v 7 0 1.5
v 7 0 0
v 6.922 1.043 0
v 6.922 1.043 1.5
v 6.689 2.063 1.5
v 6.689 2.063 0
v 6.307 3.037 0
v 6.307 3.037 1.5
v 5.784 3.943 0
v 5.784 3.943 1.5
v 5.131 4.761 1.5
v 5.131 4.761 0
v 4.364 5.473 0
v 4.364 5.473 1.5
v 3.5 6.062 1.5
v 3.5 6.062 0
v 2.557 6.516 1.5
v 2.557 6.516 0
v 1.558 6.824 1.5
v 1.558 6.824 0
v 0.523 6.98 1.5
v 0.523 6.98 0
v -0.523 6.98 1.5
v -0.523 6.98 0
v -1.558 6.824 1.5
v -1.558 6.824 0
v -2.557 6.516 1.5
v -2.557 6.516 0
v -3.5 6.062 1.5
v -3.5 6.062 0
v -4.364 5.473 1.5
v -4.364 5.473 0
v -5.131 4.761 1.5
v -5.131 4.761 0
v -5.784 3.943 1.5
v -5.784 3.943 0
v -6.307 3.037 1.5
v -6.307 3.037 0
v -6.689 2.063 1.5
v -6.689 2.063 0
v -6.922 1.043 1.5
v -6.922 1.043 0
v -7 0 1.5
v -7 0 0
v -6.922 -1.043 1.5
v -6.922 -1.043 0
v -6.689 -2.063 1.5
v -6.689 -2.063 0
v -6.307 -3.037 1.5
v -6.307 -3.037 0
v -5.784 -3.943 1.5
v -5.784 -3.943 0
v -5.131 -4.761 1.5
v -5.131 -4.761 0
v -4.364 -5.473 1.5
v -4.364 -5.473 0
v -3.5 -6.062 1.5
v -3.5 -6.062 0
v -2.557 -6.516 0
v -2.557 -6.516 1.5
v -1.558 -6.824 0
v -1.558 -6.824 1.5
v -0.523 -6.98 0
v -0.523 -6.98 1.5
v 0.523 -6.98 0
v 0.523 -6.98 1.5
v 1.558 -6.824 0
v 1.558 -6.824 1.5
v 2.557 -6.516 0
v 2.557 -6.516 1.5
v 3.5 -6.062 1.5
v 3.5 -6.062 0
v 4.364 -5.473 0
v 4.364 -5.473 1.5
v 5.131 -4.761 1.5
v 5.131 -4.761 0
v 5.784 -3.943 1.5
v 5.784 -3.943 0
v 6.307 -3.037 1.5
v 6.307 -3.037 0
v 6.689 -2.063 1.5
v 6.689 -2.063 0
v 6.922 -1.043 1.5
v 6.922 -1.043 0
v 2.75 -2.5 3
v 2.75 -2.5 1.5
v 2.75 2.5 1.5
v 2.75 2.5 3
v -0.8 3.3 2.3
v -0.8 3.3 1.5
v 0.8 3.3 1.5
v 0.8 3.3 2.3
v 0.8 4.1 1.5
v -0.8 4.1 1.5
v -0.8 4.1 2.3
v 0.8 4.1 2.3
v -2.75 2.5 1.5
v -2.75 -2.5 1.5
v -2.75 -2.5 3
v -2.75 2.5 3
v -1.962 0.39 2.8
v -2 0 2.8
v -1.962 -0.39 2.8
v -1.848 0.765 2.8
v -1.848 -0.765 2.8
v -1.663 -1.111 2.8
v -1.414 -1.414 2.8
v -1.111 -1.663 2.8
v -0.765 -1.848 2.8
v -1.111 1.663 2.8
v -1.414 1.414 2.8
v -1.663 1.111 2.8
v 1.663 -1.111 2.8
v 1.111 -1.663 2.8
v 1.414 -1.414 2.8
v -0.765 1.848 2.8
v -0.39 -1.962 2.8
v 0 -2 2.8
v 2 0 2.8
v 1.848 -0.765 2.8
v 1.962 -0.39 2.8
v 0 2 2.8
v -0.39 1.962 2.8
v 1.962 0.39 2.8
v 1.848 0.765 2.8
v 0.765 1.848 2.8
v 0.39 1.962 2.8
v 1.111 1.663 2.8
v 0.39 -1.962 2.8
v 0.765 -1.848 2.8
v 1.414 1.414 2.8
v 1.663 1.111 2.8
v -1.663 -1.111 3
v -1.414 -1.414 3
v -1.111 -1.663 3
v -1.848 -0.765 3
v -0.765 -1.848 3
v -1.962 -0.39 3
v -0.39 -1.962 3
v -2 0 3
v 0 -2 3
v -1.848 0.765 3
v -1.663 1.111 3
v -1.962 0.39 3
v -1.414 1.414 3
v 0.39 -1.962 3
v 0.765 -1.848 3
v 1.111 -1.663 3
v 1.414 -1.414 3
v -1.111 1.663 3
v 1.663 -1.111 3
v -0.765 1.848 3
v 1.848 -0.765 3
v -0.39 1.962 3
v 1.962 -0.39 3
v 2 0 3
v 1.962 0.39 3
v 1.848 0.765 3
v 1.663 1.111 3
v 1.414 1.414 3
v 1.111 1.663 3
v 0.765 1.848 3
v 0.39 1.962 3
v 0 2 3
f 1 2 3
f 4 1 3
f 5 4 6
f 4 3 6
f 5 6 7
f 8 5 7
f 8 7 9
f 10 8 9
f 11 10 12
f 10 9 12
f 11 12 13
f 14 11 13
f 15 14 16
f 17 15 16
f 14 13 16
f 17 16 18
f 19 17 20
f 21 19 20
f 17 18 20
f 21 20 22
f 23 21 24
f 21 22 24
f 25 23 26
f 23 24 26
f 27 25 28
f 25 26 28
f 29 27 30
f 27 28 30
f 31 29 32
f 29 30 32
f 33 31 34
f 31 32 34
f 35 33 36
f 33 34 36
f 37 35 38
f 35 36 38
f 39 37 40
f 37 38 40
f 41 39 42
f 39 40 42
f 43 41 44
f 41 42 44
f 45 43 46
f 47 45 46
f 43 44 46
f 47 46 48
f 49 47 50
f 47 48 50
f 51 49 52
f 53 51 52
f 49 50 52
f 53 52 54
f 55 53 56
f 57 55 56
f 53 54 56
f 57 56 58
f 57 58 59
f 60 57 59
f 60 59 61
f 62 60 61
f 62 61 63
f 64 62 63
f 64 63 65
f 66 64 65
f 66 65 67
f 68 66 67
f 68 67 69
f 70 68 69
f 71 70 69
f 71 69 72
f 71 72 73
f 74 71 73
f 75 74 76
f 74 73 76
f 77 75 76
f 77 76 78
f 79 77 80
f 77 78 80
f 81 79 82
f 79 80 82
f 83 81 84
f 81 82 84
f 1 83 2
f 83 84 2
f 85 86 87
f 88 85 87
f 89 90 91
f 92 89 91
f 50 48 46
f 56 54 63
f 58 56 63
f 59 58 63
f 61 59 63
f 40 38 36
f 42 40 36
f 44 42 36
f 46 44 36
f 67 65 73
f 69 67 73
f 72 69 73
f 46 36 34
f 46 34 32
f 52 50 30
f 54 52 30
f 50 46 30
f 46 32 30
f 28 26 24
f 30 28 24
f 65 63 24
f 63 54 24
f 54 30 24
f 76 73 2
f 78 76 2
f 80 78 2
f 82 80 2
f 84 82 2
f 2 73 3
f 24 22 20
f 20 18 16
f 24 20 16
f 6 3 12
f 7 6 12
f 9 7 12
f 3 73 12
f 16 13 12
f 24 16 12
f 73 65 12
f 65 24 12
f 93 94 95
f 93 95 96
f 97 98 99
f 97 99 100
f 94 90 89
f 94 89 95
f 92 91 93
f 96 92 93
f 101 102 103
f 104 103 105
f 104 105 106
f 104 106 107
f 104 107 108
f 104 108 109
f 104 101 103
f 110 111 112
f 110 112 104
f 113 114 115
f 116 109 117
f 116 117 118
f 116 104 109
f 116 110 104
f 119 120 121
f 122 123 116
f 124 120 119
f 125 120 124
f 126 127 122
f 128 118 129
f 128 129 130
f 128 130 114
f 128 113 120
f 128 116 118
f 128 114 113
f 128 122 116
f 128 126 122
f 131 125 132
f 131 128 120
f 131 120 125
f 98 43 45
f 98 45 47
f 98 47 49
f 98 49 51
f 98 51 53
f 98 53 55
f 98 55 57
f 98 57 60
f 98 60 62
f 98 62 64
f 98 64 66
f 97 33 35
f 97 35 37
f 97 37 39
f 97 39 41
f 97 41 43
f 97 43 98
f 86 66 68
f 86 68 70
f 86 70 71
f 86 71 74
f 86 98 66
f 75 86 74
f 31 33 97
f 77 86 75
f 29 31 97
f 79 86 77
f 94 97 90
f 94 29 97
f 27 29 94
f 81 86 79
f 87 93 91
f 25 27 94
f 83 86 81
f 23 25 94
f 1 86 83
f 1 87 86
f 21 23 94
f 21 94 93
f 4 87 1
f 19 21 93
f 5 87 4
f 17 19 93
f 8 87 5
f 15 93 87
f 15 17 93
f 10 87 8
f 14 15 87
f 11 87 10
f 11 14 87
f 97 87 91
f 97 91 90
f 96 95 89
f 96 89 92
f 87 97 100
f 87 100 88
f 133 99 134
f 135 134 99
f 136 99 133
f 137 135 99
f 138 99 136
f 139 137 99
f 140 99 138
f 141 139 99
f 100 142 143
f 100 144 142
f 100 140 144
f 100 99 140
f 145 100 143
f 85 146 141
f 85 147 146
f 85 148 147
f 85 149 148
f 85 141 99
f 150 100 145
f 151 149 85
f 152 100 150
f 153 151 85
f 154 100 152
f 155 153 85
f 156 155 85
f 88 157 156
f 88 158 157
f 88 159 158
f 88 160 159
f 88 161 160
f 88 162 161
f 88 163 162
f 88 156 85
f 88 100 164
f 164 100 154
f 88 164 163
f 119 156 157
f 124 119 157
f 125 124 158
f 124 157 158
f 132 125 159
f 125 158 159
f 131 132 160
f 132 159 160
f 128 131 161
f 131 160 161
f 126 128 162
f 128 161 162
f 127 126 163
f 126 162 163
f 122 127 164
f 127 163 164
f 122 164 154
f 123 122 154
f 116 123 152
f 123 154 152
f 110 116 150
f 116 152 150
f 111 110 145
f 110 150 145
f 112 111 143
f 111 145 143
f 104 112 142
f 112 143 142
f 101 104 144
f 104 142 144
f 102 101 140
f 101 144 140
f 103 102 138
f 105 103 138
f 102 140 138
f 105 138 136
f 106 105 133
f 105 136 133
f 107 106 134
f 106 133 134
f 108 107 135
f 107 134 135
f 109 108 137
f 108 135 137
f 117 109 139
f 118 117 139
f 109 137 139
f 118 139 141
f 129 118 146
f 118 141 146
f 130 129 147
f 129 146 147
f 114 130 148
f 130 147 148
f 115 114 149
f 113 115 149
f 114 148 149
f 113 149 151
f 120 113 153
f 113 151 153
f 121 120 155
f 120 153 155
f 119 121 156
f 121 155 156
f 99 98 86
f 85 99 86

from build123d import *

# Parameters (mm, degrees)
SKETCH1_R           = 7
BOSS_EXTRUDE1_DEPTH = 1.5
SKETCH2_W           = 5.5
SKETCH2_H           = 5
BOSS_EXTRUDE2_DEPTH = 1.5
SKETCH3_R           = 2
CUT_EXTRUDE1_DEPTH  = 0.2
SKETCH4_W           = 1.6
SKETCH4_H           = 0.8
BOSS_EXTRUDE3_DEPTH = 0.8


with BuildPart() as part:
    # Sketch1 → Boss-Extrude1 (new body)
    with BuildSketch(Plane.XY):
        Circle(SKETCH1_R)
    extrude(amount=BOSS_EXTRUDE1_DEPTH)

    # Sketch2 → Boss-Extrude2 (add)
    with BuildSketch(Plane.XY.offset(1.5)):
        Rectangle(SKETCH2_W, SKETCH2_H)
    extrude(amount=BOSS_EXTRUDE2_DEPTH)

    # Sketch3 → Cut-Extrude1 (cut)
    with BuildSketch(Plane.XY.offset(3)):
        Circle(SKETCH3_R)
    extrude(amount=-CUT_EXTRUDE1_DEPTH, mode=Mode.SUBTRACT)

    # Sketch4 → Boss-Extrude3 (add)
    with BuildSketch(Plane.XY.offset(1.5)):
        with Locations((0, 3.7)):
            Rectangle(SKETCH4_W, SKETCH4_H)
    extrude(amount=BOSS_EXTRUDE3_DEPTH)


solid = part.part
